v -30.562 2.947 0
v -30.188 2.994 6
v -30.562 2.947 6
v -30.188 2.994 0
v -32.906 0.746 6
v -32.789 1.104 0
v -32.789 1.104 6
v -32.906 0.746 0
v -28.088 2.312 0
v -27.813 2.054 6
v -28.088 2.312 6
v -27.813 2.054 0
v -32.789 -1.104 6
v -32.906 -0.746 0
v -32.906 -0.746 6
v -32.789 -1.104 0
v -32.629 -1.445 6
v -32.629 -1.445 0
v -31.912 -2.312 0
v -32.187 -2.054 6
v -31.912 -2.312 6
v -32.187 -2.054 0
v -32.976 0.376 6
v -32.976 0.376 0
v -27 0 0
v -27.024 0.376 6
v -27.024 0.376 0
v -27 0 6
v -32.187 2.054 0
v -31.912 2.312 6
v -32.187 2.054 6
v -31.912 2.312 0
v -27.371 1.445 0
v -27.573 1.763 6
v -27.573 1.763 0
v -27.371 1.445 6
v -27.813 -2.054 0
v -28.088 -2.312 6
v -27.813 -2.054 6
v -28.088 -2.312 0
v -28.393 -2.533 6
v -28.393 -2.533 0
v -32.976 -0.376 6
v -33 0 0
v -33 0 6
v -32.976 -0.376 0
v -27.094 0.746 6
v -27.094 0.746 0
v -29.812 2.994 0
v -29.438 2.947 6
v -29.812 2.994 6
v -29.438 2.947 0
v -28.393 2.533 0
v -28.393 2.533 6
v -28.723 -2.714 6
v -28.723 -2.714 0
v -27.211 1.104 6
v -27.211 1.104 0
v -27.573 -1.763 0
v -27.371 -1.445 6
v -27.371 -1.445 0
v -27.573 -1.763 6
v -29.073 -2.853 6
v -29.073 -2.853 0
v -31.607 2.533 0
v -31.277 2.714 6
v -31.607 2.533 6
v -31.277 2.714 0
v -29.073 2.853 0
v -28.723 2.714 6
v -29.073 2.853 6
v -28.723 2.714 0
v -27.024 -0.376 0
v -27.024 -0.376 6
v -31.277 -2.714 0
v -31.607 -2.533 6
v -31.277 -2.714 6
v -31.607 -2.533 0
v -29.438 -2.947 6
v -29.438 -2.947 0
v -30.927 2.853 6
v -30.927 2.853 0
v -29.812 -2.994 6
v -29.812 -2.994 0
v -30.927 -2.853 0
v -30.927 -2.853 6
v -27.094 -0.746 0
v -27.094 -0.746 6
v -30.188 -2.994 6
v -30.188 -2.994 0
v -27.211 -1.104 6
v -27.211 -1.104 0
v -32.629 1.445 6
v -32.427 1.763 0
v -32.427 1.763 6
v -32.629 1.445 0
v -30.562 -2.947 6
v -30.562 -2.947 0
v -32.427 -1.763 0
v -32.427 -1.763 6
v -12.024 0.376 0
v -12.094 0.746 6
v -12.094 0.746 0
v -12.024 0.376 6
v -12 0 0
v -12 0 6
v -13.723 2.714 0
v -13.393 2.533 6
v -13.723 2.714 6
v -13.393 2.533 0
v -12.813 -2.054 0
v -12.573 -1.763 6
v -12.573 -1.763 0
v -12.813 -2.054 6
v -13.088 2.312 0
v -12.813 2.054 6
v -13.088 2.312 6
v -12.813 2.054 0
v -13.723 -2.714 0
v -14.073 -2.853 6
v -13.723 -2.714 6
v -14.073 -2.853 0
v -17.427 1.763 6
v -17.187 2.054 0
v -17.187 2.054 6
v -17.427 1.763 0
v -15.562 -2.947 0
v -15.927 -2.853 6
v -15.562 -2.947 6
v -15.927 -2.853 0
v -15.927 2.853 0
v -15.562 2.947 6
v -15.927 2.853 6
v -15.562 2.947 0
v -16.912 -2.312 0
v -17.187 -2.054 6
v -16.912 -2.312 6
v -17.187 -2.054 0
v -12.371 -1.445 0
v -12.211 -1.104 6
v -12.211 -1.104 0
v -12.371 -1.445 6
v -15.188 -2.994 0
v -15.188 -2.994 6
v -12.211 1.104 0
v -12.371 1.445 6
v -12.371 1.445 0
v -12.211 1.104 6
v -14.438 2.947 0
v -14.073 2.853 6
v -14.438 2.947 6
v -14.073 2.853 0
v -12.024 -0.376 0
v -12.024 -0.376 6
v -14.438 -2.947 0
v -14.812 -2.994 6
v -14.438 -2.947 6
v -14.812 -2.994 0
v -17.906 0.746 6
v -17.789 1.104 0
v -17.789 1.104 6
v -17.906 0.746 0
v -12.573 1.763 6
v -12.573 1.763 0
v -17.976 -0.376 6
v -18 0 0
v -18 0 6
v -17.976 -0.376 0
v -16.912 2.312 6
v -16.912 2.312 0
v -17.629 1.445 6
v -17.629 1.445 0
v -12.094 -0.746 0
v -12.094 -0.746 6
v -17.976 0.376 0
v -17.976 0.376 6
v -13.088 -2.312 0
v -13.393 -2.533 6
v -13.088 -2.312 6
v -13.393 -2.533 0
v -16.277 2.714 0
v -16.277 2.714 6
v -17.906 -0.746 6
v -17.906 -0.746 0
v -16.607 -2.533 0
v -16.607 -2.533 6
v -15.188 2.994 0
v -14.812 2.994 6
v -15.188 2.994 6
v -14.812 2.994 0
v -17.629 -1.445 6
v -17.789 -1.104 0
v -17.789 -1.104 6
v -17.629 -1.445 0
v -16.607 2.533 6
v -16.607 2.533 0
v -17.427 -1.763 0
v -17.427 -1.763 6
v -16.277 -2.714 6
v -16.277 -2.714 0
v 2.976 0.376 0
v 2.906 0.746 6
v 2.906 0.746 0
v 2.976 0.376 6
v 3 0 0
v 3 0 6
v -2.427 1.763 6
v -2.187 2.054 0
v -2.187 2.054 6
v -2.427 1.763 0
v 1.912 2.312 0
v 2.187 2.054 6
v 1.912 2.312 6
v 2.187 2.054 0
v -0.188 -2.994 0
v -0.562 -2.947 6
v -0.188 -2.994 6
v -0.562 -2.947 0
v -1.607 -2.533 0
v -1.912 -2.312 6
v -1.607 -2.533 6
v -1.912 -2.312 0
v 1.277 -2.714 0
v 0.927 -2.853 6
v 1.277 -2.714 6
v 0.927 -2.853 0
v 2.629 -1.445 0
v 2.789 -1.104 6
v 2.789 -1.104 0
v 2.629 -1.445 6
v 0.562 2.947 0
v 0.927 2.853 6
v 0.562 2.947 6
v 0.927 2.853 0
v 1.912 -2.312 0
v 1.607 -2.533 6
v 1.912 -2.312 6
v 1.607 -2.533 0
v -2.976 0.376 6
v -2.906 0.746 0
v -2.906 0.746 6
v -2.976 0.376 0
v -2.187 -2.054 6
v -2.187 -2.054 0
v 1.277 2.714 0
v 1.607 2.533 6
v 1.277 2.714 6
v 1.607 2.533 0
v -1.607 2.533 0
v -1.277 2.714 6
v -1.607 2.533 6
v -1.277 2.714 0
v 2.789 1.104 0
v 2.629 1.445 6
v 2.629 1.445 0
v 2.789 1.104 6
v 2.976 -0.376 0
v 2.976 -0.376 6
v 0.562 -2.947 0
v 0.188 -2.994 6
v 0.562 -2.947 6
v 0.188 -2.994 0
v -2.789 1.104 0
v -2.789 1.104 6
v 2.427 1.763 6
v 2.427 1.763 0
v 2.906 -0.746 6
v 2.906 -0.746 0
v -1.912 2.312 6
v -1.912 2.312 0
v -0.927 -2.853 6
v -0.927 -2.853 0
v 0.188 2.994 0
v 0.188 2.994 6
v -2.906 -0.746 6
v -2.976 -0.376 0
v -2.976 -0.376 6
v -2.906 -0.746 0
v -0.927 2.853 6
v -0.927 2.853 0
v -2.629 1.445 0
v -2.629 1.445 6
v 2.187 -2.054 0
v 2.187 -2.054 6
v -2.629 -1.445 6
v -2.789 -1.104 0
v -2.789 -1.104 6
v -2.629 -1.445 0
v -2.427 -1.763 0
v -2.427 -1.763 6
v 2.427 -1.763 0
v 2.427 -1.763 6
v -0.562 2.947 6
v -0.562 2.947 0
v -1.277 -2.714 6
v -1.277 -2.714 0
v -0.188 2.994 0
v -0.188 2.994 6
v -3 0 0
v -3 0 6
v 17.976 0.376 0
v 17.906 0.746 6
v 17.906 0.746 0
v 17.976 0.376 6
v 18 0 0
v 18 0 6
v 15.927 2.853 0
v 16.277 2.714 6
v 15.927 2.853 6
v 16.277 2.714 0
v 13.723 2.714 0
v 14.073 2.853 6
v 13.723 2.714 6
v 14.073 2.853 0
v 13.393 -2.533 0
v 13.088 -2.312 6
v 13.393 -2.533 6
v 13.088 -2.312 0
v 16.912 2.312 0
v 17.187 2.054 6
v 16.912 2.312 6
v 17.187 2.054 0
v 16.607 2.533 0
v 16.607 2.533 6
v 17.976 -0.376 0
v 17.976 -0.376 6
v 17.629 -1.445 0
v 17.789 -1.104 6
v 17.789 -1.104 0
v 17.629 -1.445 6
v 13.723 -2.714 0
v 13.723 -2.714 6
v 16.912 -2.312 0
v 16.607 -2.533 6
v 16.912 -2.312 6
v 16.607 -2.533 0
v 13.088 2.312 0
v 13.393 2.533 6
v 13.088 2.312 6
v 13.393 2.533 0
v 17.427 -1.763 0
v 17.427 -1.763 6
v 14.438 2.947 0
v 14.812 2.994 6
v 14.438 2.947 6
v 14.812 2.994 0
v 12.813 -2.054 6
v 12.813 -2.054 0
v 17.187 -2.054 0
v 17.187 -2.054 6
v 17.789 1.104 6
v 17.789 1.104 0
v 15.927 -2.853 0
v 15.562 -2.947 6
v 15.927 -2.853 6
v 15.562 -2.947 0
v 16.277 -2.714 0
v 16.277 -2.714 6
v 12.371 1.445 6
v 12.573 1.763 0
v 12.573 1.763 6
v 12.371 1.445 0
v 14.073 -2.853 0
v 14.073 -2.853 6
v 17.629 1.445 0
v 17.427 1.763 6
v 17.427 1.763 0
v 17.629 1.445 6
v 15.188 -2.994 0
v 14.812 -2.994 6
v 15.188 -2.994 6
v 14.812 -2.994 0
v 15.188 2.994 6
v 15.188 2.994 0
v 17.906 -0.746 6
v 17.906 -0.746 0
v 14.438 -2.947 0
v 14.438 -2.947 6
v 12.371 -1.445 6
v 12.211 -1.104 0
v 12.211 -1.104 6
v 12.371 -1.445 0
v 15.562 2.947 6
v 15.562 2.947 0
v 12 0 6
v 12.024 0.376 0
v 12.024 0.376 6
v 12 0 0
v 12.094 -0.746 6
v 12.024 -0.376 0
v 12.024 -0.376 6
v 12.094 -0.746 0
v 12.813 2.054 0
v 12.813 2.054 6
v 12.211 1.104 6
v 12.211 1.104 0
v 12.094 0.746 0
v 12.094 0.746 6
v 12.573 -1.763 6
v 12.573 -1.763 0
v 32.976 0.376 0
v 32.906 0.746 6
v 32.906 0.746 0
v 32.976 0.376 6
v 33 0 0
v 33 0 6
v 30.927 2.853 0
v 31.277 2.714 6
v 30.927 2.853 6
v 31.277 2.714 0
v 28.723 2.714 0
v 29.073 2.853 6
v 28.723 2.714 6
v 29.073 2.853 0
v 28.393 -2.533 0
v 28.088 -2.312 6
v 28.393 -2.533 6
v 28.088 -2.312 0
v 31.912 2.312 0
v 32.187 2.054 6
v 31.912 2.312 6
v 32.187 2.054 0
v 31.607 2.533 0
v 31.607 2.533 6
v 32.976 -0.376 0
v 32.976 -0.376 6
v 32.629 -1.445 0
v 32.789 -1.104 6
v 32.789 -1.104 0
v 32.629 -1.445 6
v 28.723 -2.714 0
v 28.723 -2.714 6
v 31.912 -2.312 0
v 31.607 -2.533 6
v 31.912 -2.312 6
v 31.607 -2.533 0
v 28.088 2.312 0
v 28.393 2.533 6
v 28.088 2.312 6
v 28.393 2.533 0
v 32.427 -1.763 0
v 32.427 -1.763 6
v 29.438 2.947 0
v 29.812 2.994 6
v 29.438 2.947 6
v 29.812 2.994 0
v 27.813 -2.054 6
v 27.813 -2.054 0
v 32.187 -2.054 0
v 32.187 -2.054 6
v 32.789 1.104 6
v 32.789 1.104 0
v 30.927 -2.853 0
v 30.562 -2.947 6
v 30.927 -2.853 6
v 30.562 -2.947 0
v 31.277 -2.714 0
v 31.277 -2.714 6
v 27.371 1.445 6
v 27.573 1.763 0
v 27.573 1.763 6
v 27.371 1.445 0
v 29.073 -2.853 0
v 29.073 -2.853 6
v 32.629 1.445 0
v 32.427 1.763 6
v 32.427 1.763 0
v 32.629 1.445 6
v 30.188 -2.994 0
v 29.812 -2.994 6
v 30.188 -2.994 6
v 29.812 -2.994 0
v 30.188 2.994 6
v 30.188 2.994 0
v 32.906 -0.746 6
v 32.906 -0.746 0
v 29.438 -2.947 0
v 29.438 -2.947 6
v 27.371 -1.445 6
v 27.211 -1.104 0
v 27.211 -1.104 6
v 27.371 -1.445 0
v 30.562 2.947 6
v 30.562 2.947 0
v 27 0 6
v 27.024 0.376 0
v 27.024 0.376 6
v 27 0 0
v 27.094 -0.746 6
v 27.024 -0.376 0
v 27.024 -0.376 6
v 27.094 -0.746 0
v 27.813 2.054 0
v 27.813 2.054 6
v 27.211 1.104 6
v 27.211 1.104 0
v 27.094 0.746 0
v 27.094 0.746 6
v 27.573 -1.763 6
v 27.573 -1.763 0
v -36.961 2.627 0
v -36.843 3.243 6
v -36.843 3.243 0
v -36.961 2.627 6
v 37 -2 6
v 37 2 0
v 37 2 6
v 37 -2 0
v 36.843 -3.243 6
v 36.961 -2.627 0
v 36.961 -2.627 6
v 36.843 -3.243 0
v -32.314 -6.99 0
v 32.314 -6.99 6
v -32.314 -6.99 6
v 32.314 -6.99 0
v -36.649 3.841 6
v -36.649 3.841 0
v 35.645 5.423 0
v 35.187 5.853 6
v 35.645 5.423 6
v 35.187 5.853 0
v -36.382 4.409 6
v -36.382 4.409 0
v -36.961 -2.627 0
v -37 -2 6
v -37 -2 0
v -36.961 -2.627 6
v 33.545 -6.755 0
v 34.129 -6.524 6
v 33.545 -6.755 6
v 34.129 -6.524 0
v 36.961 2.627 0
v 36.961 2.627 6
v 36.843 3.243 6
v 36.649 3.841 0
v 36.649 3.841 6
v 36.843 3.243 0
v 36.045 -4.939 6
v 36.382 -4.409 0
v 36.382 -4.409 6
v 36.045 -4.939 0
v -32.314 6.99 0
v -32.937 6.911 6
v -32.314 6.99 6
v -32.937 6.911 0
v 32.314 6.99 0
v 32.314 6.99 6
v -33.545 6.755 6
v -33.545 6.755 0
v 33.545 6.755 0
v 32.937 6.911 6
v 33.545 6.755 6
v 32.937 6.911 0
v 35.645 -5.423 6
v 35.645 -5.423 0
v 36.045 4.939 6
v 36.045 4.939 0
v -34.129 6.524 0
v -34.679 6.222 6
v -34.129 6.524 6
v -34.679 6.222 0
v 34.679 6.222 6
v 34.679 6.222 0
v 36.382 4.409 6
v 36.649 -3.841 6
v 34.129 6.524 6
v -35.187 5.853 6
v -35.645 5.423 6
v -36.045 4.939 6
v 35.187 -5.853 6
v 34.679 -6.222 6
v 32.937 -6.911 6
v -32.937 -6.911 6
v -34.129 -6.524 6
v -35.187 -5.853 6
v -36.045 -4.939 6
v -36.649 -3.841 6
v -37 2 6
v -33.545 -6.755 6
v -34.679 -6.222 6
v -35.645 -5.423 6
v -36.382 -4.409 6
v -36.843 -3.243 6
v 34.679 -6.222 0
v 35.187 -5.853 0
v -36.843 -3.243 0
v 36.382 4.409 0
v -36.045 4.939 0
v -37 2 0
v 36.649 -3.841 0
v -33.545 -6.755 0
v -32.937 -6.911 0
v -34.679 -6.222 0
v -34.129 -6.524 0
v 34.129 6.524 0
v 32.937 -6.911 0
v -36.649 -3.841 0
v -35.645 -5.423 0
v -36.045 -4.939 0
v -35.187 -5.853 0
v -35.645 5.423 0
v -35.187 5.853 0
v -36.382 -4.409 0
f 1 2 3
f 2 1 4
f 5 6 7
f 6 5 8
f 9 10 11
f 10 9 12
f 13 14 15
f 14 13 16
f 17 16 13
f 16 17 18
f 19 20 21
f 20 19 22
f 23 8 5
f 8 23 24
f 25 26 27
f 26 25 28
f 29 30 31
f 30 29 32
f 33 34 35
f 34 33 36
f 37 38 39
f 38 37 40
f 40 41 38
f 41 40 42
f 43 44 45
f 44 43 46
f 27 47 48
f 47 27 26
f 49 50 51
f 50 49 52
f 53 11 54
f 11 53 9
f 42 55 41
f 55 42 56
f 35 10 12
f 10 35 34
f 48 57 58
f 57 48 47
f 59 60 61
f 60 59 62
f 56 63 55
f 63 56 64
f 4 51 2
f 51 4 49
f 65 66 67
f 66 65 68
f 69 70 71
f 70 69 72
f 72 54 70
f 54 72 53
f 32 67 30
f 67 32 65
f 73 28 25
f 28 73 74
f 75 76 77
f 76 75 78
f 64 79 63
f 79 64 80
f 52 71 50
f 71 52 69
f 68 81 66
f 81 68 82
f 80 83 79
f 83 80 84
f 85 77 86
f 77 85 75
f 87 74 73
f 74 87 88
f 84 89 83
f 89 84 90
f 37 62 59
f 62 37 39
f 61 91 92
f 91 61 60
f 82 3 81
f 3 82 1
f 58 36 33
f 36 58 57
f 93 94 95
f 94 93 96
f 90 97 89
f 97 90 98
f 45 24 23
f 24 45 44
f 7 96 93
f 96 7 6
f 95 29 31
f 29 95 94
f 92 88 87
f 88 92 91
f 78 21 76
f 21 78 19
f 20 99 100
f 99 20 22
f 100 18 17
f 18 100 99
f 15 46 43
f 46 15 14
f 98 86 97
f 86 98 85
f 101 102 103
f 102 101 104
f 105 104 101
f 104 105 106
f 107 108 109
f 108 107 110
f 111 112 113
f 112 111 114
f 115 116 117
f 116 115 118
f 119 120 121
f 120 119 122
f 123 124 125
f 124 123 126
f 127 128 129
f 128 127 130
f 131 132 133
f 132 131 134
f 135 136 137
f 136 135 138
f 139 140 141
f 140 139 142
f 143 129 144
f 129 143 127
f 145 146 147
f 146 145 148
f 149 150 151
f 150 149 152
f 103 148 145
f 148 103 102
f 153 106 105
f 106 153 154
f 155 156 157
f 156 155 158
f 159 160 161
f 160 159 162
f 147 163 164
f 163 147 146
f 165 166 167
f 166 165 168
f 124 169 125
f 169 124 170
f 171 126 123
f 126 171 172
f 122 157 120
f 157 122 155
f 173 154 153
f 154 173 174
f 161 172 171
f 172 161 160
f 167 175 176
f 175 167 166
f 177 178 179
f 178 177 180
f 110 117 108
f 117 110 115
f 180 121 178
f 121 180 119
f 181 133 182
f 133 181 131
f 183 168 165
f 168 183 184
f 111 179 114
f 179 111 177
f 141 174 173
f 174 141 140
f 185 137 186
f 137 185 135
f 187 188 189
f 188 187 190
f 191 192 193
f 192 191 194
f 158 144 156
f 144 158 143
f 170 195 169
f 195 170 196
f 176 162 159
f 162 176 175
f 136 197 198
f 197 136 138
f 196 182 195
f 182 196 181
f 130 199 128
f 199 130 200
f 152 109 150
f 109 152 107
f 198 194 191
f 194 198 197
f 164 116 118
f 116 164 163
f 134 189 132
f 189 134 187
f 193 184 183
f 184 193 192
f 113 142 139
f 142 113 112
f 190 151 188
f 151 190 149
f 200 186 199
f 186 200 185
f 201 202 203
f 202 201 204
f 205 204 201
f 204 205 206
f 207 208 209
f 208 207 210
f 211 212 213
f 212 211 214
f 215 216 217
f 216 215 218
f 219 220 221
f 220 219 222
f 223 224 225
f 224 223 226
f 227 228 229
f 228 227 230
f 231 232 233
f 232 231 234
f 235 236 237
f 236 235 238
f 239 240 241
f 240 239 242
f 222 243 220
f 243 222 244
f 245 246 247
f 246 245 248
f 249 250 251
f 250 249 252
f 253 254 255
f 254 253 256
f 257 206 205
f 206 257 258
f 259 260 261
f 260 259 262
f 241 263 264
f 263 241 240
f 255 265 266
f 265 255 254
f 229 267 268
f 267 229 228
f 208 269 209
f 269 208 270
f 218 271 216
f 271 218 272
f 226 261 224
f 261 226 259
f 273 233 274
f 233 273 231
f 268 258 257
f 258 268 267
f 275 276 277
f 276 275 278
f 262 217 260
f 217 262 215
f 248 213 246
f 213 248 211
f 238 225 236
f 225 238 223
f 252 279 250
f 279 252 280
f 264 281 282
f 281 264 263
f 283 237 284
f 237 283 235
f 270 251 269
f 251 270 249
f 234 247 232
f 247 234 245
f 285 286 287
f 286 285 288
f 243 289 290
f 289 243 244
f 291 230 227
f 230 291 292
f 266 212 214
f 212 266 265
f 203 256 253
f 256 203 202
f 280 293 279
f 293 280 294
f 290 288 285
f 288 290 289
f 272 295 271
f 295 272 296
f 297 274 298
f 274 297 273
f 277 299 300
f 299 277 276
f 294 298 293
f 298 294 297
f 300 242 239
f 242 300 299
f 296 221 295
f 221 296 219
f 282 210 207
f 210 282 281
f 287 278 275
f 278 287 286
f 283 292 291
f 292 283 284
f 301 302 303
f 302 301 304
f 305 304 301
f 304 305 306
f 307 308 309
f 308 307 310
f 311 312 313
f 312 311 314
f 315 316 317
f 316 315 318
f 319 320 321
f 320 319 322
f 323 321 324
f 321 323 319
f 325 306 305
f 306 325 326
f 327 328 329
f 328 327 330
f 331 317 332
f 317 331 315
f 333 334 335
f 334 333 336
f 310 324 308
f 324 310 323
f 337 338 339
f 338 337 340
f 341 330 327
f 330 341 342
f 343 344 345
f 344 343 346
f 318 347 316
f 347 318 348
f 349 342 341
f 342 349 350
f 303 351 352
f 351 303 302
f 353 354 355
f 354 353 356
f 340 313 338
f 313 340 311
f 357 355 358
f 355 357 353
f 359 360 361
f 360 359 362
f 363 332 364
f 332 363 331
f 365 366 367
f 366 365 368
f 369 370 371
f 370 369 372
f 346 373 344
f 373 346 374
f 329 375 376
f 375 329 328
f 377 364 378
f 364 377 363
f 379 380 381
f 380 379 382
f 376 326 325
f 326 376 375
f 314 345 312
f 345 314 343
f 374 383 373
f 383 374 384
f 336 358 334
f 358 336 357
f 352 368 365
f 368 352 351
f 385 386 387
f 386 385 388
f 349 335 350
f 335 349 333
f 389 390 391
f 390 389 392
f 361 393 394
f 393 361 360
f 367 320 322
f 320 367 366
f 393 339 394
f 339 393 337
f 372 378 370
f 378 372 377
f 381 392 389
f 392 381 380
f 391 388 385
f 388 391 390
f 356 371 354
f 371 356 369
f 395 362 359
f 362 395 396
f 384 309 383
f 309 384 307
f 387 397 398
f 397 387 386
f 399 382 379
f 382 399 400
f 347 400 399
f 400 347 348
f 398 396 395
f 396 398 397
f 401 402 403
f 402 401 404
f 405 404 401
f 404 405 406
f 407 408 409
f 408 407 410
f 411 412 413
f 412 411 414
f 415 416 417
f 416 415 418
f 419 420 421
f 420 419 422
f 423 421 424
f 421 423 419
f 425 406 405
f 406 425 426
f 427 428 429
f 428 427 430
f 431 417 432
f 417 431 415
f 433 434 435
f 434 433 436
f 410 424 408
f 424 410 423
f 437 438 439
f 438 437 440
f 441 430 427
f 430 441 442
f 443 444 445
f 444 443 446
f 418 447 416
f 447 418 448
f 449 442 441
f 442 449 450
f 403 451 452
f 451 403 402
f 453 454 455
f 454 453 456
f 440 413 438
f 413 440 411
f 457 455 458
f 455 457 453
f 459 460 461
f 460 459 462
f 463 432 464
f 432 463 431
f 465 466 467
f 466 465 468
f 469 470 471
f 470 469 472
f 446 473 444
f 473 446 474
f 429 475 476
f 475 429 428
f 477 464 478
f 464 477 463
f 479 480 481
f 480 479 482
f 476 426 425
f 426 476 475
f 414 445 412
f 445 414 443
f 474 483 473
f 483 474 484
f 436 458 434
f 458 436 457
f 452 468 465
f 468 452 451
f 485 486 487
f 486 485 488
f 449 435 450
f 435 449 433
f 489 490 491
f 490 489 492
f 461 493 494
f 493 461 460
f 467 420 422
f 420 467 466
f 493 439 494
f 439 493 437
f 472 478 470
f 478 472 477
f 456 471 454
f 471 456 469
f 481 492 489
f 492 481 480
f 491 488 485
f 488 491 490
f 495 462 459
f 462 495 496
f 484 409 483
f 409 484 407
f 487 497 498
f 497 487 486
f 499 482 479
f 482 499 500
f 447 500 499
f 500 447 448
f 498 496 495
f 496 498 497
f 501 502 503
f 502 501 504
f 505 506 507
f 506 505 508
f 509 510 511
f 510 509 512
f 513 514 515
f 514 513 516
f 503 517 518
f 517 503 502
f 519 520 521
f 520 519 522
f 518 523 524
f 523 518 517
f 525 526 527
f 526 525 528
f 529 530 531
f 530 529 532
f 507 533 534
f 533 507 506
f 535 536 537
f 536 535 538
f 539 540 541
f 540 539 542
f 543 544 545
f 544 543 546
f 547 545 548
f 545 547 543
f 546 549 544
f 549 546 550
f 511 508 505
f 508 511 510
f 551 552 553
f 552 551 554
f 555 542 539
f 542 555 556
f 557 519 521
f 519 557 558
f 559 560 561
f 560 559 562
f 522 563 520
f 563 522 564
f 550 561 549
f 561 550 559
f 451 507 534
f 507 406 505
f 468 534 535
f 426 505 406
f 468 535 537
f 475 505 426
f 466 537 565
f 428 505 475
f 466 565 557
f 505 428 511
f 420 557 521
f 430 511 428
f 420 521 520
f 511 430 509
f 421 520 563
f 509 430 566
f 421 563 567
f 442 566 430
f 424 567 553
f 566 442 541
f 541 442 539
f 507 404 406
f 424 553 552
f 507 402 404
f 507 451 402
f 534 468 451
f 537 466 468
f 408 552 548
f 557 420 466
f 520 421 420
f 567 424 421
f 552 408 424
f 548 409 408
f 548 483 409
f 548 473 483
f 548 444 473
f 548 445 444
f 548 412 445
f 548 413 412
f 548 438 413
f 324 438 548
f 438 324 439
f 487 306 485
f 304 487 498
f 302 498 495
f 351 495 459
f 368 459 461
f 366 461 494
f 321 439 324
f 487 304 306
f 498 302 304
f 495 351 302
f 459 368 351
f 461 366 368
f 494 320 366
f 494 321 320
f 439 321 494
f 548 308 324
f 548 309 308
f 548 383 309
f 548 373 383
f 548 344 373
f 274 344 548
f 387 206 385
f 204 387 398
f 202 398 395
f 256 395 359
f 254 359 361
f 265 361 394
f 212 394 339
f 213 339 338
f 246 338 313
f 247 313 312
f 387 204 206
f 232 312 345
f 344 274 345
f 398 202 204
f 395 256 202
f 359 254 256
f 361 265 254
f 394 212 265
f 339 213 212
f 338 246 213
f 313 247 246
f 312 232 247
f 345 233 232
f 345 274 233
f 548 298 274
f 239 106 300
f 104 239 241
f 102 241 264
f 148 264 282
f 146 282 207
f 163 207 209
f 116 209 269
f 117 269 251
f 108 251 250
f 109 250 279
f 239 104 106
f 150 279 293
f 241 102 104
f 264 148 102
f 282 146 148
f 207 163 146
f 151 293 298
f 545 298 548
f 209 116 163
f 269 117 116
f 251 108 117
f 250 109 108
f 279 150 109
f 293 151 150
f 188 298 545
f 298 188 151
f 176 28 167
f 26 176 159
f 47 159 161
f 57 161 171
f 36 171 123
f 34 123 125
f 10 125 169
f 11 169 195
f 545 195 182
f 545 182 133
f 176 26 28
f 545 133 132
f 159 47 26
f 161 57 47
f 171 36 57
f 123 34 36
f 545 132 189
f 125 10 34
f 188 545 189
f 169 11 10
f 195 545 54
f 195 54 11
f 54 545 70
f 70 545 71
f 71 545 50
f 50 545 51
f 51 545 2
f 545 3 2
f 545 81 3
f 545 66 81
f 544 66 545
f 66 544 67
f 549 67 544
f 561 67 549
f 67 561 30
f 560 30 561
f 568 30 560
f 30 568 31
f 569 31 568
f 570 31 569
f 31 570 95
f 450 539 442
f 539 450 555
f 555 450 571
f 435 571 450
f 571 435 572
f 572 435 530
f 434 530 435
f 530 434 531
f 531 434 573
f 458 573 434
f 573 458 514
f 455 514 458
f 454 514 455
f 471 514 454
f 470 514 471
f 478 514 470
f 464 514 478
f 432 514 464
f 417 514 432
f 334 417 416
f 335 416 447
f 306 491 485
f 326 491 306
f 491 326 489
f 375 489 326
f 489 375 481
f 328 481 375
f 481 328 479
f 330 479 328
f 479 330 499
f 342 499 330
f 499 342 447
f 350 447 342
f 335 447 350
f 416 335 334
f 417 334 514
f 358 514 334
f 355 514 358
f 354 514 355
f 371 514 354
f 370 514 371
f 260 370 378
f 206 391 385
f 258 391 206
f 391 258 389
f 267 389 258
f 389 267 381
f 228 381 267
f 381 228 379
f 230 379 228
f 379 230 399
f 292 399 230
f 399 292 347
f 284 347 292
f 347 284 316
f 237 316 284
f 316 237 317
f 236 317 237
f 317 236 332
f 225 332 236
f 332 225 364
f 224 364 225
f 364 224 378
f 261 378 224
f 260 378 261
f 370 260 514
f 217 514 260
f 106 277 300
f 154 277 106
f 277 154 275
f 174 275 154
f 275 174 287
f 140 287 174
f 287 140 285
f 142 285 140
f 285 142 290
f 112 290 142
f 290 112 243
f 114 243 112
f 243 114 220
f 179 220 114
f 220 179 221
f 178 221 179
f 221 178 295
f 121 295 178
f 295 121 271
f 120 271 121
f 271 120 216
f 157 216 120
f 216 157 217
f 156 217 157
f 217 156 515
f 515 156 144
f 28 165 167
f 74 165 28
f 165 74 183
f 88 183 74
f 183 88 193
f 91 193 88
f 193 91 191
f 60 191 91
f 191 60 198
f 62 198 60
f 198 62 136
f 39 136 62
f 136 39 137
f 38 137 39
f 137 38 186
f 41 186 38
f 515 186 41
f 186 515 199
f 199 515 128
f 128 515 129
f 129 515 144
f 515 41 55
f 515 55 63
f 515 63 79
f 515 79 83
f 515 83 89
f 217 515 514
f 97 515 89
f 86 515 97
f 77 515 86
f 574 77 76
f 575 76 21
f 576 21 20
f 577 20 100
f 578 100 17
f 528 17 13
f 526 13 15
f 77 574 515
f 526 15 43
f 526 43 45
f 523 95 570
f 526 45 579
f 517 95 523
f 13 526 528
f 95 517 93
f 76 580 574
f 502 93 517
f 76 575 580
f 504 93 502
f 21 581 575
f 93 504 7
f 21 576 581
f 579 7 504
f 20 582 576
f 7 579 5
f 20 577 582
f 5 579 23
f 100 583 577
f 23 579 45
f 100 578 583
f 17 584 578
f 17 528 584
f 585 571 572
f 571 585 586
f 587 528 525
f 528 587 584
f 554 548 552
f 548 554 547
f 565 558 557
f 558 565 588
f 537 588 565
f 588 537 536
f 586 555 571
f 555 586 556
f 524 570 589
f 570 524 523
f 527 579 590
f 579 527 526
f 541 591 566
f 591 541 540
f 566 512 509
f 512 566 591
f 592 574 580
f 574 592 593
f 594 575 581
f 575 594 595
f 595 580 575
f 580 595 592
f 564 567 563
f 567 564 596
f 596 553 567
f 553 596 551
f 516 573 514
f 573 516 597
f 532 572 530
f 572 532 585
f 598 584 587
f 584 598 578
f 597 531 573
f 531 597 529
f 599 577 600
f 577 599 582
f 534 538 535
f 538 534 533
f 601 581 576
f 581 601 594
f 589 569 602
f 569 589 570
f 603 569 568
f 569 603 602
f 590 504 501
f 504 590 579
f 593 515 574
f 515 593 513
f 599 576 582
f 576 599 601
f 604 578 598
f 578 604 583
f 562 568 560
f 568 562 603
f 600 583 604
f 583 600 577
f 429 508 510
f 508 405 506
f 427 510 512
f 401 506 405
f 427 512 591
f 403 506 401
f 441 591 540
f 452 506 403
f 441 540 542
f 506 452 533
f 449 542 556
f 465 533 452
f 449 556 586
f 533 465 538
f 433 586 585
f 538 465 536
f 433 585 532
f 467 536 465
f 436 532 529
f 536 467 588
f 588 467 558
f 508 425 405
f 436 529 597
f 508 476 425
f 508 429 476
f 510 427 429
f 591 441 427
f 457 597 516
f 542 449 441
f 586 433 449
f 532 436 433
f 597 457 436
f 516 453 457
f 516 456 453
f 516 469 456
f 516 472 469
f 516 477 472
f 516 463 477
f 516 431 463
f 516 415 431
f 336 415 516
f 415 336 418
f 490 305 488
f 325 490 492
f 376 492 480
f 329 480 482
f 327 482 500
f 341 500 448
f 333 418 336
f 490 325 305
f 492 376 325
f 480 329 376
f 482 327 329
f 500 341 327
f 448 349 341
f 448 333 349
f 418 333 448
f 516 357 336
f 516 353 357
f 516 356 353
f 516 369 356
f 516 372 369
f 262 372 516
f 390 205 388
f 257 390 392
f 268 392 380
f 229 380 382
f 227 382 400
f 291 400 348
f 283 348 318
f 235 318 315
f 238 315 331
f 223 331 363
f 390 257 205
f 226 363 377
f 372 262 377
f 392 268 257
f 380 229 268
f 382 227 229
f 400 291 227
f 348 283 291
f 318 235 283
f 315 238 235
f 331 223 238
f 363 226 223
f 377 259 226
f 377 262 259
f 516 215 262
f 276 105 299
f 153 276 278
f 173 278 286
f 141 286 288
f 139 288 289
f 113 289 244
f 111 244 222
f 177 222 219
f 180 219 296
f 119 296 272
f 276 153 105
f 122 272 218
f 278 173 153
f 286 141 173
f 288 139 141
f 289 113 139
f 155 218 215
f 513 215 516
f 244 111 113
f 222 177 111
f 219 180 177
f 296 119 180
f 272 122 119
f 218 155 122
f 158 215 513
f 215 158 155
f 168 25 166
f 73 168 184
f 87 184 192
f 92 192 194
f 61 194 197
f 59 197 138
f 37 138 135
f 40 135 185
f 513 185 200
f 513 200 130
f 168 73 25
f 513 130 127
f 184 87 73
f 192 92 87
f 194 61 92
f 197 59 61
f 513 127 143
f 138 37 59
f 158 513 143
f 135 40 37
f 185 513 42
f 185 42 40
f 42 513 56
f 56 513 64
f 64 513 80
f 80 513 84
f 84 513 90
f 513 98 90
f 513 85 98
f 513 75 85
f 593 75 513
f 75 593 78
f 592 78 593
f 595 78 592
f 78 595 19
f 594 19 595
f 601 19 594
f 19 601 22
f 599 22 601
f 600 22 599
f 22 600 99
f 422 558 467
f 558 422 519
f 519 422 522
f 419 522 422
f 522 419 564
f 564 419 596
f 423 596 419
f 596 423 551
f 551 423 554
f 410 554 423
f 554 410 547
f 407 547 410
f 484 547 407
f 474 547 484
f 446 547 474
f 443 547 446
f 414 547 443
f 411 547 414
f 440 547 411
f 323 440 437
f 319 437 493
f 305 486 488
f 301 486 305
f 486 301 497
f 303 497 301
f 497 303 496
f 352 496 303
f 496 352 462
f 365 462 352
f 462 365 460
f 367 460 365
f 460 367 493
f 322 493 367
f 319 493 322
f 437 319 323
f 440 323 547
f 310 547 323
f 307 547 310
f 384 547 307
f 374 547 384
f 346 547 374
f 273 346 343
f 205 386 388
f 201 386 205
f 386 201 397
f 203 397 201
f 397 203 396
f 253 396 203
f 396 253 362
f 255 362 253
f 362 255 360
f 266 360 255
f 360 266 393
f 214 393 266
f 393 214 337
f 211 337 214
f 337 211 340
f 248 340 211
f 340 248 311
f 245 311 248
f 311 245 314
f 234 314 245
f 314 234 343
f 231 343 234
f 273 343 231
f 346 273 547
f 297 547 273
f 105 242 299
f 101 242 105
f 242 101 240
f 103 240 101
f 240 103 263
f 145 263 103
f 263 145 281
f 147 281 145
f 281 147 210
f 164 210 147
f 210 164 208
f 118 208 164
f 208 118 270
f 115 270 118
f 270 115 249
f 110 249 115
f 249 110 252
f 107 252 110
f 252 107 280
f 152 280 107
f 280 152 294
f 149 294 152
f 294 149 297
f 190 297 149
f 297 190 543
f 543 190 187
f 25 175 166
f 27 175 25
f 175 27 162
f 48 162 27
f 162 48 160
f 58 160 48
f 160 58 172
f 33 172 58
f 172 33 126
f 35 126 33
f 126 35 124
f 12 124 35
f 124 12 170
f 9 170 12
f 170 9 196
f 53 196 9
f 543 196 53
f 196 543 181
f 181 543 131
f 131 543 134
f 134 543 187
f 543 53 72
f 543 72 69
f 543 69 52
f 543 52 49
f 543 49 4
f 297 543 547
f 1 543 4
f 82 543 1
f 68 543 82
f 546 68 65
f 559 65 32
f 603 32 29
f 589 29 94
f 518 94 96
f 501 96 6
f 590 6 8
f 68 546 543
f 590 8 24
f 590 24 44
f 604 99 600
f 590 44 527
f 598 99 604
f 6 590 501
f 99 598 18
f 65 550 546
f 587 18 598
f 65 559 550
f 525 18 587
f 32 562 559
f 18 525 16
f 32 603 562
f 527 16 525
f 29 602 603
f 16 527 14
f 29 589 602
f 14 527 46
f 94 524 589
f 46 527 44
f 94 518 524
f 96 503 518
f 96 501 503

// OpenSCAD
$fn = 50;


difference() {
	union() {
		hull() {
			translate(v = [-32.0000000000, 2.0000000000, 0]) {
				cylinder(h = 6, r = 5);
			}
			translate(v = [32.0000000000, 2.0000000000, 0]) {
				cylinder(h = 6, r = 5);
			}
			translate(v = [-32.0000000000, -2.0000000000, 0]) {
				cylinder(h = 6, r = 5);
			}
			translate(v = [32.0000000000, -2.0000000000, 0]) {
				cylinder(h = 6, r = 5);
			}
		}
	}
	union() {
		translate(v = [-30.0000000000, 0.0000000000, 0]) {
			translate(v = [0, 0, -100]) {
				cylinder(h = 200, r = 3.0000000000);
			}
		}
		translate(v = [-15.0000000000, 0.0000000000, 0]) {
			translate(v = [0, 0, -100]) {
				cylinder(h = 200, r = 3.0000000000);
			}
		}
		translate(v = [0, 0, -100]) {
			cylinder(h = 200, r = 3.0000000000);
		}
		translate(v = [15.0000000000, 0.0000000000, 0]) {
			translate(v = [0, 0, -100]) {
				cylinder(h = 200, r = 3.0000000000);
			}
		}
		translate(v = [30.0000000000, 0.0000000000, 0]) {
			translate(v = [0, 0, -100]) {
				cylinder(h = 200, r = 3.0000000000);
			}
		}
	}
}
